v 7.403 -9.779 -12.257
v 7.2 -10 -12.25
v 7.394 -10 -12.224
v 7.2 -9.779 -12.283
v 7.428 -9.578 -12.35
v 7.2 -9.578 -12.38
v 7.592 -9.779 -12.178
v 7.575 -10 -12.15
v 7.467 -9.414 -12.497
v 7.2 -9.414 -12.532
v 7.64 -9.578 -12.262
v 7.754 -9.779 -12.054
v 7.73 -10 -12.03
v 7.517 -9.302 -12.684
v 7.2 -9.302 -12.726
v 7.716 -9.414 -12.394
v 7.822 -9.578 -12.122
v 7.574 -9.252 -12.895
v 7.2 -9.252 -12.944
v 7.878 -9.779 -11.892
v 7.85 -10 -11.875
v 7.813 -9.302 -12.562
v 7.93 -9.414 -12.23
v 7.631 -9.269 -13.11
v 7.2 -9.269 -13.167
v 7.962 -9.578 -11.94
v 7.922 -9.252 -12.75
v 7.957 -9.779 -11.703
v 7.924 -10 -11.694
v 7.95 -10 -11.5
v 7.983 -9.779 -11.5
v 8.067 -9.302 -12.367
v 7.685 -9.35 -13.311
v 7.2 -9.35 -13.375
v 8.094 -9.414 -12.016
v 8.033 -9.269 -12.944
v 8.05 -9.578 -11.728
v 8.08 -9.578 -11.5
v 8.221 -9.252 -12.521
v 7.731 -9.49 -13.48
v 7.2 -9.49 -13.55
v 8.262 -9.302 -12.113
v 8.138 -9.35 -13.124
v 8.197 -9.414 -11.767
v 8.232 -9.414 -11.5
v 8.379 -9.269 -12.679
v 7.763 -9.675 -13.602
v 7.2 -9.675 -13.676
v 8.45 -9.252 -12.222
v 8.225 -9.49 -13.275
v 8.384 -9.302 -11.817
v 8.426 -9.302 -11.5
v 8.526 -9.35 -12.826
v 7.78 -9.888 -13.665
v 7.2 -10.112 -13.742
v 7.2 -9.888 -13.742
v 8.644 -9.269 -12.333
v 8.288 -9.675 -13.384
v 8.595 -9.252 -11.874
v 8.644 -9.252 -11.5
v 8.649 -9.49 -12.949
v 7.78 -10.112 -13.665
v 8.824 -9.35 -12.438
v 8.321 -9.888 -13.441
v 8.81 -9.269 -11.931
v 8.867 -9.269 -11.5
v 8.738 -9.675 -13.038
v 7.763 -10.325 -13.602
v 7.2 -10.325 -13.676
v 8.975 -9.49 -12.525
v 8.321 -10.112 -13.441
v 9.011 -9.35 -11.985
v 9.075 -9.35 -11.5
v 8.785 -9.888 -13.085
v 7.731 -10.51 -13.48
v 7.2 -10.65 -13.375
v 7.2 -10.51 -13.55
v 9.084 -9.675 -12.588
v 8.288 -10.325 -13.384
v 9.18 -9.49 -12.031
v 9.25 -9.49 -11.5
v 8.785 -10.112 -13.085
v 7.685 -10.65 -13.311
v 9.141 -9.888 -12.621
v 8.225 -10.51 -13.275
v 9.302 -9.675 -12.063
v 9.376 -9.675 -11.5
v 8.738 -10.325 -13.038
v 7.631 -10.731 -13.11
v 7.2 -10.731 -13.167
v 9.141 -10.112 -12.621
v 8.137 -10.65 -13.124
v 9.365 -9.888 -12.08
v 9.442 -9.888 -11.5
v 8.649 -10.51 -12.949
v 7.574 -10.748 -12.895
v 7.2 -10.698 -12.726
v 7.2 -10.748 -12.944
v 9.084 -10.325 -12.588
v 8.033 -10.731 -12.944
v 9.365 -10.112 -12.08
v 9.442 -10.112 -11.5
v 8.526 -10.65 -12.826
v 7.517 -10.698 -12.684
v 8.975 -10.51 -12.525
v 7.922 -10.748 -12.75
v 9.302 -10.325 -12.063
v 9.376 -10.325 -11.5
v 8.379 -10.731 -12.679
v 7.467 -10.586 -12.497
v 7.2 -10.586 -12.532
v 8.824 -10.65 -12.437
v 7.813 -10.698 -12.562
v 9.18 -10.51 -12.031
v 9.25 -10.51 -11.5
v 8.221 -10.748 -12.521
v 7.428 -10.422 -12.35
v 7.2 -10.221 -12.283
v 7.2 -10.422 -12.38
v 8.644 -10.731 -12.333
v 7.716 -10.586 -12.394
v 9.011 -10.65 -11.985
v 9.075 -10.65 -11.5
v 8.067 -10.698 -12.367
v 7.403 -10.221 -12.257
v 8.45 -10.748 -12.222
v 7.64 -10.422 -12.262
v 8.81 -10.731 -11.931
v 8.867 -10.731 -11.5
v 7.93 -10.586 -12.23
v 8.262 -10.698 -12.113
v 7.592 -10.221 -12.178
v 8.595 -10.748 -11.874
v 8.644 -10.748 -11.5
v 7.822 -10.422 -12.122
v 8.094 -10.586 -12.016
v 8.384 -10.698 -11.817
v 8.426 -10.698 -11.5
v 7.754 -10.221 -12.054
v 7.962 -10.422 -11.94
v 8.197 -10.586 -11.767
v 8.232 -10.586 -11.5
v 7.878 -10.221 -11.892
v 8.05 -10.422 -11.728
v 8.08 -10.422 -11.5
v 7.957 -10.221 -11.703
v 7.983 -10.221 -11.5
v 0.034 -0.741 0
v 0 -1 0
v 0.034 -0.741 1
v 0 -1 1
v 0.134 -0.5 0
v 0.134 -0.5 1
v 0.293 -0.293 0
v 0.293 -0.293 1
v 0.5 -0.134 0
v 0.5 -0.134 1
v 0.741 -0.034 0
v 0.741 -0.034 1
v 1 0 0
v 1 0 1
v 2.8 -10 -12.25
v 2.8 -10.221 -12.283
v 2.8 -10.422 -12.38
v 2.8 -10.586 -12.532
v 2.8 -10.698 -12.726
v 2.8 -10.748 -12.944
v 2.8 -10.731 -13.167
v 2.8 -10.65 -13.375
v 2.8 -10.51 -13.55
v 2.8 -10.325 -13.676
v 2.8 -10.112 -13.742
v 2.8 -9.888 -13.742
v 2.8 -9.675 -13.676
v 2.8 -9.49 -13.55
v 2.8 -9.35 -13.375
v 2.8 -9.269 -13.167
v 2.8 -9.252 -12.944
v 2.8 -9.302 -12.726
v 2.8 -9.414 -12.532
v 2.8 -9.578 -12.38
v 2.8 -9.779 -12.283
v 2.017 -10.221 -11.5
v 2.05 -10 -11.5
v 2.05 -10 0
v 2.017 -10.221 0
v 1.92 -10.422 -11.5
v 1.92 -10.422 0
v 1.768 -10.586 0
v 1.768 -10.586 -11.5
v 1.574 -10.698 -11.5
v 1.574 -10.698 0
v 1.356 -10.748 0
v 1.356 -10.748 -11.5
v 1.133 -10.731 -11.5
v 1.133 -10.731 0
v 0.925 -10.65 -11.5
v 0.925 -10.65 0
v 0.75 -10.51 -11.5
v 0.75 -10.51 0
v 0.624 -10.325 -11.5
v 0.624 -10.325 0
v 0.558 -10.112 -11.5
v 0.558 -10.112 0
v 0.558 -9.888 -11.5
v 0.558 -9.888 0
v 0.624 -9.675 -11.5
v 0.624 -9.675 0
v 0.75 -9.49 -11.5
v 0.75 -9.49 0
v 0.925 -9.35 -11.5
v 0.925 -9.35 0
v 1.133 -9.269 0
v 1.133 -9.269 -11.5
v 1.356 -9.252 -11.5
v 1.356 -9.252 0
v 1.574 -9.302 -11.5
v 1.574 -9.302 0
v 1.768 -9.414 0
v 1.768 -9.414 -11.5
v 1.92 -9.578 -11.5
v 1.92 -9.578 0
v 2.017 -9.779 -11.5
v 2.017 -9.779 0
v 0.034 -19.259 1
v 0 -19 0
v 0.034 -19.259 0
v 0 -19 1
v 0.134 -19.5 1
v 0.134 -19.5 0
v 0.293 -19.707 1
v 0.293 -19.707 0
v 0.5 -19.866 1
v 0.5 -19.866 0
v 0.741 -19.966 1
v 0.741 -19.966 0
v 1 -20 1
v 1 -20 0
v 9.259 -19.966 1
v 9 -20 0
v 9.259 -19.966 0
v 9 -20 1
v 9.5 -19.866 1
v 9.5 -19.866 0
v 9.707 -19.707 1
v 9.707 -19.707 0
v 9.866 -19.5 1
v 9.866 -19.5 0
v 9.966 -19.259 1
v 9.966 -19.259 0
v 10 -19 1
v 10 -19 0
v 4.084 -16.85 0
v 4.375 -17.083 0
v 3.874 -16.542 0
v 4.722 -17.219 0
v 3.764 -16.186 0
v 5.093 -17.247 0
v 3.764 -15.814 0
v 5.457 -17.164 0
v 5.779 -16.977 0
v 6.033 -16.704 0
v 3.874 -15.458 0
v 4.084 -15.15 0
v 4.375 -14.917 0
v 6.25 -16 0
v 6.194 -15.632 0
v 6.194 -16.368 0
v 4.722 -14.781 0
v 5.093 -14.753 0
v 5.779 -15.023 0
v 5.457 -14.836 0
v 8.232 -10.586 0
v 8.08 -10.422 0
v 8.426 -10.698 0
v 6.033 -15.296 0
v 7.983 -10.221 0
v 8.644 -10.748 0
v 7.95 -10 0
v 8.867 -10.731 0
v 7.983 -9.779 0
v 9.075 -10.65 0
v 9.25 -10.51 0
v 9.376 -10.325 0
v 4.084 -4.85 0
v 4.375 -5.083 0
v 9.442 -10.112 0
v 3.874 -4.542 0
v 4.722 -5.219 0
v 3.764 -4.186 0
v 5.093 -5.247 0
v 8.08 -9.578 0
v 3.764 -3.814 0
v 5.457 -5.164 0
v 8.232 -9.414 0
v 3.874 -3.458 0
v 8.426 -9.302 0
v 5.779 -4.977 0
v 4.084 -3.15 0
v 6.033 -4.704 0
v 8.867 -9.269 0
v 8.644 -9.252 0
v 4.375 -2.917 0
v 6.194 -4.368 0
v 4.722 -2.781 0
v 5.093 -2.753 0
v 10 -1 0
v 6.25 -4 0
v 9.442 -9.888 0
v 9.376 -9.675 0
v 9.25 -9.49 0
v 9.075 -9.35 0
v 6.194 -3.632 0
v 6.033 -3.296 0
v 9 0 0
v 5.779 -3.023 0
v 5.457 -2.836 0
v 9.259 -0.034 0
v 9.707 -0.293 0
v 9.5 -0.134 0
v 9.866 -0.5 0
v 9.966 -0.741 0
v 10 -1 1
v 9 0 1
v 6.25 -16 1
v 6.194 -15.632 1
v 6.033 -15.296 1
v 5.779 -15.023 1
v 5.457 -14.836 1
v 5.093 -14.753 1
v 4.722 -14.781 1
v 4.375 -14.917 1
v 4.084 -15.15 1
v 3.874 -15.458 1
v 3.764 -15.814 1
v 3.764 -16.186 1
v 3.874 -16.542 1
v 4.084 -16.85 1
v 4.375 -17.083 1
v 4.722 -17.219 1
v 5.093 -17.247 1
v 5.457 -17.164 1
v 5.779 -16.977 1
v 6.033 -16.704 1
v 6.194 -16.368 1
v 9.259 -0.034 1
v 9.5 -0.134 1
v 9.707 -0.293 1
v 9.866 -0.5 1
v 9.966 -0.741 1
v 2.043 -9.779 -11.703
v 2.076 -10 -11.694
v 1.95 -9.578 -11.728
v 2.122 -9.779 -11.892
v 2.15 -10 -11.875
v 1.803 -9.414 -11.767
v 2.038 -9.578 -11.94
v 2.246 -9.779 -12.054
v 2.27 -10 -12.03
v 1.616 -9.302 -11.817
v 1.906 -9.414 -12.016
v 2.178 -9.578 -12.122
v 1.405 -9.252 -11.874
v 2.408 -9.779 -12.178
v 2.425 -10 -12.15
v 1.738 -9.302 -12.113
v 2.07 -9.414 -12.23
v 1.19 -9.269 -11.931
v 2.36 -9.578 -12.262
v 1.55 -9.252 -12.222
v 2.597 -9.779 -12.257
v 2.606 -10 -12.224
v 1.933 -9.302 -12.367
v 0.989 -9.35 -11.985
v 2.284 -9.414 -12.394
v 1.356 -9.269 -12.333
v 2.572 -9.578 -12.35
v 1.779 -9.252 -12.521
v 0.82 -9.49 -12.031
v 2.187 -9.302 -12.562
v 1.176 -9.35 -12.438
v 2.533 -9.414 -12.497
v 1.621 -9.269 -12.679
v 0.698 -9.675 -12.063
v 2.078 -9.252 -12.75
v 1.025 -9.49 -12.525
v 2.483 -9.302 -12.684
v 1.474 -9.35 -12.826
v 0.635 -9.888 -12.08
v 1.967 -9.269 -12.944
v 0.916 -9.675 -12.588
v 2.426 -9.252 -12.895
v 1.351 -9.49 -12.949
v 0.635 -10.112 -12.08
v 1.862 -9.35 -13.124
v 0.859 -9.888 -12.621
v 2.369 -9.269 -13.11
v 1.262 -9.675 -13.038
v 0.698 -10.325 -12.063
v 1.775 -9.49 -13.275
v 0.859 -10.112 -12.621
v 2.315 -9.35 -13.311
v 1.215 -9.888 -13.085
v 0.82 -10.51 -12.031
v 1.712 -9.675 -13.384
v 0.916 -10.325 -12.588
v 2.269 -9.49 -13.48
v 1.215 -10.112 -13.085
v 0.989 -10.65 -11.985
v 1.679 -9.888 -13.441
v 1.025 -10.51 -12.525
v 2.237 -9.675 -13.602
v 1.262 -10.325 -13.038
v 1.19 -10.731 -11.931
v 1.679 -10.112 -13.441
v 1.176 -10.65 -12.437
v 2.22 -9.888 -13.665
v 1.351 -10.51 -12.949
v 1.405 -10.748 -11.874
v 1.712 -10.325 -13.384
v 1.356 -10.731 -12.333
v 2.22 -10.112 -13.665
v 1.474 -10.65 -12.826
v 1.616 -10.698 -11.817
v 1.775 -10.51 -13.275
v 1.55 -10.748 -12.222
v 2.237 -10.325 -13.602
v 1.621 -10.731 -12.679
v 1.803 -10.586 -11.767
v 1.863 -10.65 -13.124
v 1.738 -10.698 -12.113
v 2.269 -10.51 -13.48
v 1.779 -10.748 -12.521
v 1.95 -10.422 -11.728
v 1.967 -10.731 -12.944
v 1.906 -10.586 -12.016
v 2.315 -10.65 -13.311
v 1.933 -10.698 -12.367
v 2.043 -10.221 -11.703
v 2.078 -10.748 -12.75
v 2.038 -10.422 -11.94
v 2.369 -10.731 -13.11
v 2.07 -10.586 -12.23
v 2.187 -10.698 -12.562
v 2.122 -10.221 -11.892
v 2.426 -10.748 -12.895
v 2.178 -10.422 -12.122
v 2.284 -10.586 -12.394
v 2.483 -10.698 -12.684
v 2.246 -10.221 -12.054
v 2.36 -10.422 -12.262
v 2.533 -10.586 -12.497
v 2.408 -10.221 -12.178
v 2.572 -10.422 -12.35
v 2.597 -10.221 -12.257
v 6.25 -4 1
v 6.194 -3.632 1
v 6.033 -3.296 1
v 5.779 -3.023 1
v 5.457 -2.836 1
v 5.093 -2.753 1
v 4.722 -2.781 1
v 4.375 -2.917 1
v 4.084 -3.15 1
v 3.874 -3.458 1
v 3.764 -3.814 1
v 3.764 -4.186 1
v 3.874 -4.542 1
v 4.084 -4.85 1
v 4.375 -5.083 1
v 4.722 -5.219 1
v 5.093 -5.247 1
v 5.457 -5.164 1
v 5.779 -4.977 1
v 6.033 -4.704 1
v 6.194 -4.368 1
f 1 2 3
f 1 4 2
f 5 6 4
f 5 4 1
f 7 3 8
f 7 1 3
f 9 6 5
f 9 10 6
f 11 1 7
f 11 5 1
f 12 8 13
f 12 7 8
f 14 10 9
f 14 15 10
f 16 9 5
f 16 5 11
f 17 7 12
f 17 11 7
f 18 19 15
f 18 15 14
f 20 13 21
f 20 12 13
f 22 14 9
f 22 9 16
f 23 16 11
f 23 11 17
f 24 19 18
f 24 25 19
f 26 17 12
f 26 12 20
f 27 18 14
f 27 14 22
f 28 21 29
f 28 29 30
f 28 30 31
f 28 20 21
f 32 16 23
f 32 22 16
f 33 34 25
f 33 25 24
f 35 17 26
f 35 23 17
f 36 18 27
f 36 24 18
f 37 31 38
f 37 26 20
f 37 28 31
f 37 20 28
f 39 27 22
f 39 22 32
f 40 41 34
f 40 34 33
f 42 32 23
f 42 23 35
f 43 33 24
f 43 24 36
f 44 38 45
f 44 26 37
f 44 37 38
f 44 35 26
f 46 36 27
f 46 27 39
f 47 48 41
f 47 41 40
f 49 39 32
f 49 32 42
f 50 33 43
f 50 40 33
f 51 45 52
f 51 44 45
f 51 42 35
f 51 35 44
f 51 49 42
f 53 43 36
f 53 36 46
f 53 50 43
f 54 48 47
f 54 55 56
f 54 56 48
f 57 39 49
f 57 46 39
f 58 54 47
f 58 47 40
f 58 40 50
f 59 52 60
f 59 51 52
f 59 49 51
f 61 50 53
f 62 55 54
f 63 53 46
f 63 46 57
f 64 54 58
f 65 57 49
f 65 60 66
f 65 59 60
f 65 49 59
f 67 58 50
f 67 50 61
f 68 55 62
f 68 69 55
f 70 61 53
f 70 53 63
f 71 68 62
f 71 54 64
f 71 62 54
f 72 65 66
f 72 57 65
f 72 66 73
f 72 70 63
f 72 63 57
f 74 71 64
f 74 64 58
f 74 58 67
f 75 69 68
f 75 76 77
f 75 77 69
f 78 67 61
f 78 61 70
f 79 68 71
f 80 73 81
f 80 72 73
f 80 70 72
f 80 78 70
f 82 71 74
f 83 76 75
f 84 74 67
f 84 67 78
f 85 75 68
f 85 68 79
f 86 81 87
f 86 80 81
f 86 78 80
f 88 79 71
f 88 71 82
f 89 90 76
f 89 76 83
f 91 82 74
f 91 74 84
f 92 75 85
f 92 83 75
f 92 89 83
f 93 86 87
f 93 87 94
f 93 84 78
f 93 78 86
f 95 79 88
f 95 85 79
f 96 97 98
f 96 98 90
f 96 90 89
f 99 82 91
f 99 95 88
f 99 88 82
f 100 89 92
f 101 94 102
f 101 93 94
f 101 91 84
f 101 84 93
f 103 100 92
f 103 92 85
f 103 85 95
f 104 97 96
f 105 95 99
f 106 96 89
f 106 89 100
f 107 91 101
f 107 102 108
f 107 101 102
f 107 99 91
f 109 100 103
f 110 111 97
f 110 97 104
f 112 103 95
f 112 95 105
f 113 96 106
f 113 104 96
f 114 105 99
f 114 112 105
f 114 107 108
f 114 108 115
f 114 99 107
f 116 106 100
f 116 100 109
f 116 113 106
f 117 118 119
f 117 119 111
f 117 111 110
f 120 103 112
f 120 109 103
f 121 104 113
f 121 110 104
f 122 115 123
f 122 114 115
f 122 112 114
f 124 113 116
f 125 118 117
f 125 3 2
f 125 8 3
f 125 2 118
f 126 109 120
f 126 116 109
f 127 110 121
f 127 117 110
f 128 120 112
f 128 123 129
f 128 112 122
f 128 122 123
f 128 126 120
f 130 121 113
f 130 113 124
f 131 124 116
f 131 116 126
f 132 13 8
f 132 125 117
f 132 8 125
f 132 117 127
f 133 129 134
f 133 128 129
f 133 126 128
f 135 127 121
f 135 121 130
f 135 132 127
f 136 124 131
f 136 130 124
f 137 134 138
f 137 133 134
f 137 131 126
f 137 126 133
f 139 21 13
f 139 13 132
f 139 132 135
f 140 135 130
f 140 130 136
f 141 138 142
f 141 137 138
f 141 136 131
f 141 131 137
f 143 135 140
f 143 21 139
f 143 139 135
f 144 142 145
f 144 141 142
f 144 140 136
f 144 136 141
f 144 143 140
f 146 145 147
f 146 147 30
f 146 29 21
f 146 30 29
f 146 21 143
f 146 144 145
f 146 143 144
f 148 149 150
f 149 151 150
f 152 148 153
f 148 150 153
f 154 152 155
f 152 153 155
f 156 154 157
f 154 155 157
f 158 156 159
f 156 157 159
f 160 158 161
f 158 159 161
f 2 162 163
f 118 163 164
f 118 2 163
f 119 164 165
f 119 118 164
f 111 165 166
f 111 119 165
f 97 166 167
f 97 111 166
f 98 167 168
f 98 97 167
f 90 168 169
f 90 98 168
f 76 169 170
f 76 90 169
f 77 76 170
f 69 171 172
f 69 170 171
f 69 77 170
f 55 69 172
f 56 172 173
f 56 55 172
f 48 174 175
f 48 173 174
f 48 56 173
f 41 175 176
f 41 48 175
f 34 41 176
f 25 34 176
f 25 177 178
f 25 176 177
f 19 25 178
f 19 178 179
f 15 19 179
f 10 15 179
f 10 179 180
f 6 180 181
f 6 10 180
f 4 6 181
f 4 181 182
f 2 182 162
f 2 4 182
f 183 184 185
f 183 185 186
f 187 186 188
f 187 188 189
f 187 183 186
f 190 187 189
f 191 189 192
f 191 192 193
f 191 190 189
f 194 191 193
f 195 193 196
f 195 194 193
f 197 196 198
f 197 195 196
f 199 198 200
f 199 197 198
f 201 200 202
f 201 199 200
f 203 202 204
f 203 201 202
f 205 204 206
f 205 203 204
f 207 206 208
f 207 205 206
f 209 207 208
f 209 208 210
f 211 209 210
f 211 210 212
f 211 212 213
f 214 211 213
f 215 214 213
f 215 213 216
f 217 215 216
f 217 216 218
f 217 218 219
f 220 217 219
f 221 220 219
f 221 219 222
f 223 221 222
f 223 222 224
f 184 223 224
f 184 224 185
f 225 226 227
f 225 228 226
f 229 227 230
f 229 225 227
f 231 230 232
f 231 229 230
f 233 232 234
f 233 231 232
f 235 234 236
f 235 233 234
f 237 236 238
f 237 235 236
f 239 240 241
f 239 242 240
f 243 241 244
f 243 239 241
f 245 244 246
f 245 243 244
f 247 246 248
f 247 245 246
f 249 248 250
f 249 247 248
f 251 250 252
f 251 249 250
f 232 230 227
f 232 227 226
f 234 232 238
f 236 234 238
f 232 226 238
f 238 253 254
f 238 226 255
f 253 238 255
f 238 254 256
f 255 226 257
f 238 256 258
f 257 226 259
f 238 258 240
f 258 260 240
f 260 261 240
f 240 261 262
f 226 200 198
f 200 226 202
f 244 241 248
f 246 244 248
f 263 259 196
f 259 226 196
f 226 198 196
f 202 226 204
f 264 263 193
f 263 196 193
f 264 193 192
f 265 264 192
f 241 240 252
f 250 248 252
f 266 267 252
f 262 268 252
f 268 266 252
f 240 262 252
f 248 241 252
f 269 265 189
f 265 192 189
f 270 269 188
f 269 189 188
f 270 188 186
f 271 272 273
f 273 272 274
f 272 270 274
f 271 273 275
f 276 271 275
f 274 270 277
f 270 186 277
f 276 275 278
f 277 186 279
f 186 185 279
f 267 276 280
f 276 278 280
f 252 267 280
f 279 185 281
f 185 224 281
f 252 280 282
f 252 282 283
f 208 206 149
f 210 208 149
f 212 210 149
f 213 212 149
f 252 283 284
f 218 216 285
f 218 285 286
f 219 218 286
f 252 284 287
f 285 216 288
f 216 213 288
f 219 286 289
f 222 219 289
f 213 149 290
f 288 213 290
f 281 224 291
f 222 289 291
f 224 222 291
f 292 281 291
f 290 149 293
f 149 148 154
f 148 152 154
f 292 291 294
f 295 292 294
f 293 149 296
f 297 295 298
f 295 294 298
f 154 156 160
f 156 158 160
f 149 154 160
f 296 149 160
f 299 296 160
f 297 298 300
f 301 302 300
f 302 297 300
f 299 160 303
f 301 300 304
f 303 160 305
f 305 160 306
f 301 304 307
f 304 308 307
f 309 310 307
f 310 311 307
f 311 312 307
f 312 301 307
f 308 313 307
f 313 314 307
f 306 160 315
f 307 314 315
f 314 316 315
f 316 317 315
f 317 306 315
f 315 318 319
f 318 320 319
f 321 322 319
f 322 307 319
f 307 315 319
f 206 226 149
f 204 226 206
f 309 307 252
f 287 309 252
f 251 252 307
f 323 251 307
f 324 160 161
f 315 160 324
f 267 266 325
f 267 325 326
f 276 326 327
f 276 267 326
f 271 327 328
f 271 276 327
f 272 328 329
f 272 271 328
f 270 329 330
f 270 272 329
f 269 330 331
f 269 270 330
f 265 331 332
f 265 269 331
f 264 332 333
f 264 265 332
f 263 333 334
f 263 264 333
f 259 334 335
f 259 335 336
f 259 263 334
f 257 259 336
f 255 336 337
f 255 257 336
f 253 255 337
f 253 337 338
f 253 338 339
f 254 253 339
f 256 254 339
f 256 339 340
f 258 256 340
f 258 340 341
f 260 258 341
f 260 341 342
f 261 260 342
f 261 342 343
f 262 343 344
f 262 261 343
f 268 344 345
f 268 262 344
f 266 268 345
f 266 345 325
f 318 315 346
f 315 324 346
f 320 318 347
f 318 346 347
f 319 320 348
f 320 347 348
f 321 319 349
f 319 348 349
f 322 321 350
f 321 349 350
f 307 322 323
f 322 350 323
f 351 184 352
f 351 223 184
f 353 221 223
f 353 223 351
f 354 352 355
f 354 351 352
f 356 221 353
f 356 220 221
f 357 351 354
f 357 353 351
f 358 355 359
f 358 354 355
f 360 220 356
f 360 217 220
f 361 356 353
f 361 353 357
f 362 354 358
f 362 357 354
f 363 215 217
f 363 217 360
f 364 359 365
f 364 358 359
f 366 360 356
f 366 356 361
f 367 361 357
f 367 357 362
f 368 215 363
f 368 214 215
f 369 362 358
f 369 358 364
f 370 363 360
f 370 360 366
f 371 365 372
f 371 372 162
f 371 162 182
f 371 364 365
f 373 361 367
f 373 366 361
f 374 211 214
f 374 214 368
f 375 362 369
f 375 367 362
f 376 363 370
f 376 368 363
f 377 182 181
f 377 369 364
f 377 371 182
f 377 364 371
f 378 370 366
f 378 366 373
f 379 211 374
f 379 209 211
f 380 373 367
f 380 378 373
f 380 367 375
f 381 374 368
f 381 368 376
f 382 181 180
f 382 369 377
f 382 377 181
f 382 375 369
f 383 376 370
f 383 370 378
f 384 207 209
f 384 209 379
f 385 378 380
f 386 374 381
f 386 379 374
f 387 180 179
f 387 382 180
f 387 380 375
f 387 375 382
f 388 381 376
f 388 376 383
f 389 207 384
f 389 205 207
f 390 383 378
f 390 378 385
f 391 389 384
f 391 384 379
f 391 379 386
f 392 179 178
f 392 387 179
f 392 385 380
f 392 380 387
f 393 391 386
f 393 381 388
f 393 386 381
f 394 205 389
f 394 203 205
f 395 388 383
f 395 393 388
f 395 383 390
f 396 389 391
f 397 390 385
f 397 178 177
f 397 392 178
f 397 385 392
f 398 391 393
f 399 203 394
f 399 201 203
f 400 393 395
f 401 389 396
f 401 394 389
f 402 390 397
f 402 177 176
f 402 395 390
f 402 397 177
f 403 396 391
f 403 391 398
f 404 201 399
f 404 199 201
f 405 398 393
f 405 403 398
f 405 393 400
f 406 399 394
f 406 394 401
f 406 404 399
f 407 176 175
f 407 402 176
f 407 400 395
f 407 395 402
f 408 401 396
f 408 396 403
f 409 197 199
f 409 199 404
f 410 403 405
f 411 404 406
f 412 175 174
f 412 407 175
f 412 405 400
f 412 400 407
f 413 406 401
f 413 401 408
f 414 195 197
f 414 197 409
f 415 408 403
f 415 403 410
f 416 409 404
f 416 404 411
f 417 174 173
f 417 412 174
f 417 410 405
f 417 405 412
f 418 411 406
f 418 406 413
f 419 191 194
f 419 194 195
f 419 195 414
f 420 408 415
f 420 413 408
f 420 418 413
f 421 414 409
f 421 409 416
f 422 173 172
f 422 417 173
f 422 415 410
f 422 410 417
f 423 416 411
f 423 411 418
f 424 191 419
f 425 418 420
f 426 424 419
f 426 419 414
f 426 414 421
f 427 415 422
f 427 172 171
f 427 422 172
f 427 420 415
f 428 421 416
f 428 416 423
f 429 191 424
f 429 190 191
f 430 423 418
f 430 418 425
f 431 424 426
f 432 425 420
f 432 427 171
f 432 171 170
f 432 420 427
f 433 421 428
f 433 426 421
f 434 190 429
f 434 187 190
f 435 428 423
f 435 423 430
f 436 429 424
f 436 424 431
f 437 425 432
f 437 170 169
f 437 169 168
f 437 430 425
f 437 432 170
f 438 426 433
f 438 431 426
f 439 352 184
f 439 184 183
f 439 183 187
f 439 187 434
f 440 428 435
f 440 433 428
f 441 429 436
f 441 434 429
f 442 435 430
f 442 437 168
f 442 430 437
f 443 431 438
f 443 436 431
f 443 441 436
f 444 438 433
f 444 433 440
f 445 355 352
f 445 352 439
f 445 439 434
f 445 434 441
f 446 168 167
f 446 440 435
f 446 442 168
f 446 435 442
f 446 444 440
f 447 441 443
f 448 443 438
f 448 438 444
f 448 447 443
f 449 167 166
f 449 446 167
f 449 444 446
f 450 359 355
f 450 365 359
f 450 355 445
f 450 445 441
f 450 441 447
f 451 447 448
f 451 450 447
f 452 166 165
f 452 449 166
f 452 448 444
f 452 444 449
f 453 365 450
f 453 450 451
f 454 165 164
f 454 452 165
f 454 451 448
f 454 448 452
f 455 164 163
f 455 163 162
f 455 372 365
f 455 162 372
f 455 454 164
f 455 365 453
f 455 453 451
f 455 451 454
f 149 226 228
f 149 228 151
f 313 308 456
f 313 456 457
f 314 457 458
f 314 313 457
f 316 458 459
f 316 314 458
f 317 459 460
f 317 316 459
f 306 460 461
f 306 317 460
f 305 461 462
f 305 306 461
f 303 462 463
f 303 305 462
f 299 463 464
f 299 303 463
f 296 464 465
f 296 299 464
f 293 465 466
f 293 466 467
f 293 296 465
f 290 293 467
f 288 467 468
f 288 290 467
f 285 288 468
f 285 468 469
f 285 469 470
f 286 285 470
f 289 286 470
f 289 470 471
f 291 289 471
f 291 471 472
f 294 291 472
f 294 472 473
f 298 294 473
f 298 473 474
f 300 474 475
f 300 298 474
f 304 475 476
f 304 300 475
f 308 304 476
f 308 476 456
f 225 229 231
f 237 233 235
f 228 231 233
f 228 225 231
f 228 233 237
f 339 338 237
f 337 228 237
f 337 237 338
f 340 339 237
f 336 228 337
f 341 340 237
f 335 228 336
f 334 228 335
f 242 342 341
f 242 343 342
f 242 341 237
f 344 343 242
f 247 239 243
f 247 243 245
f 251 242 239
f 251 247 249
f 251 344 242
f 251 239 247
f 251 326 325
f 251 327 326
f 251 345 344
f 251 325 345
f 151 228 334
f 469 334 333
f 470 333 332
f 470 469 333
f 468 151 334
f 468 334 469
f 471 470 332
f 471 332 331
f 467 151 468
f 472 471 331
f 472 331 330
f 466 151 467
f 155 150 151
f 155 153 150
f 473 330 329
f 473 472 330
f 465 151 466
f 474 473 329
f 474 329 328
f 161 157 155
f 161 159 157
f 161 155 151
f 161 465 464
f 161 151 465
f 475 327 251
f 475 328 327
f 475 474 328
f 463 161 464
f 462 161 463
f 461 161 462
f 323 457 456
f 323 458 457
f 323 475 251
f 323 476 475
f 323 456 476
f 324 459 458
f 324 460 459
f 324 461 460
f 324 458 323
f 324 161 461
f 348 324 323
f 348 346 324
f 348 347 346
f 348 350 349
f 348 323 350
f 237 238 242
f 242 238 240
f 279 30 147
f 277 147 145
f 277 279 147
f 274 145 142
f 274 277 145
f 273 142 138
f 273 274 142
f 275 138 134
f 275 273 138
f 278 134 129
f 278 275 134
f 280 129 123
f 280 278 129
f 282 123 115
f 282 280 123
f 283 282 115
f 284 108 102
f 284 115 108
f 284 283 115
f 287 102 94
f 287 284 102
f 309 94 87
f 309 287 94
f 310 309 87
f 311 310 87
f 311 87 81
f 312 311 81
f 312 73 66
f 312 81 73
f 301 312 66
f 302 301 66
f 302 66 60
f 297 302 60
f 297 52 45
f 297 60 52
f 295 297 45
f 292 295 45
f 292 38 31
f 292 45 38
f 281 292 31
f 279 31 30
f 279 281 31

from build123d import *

# Parameters (mm, degrees)
SKETCH_1_W      = 10
SKETCH_1_H      = 20
SKETCH_1_R      = 1.25
EXTRUDE_1_DEPTH = 1
FILLET_1_R      = 1
SKETCH_13_R     = 0.75


with BuildPart() as part:
    # 草图1 → 凸台-拉伸1 (new body)
    with BuildSketch(Plane.XY):
        with Locations((5, -10)):
            Rectangle(SKETCH_1_W, SKETCH_1_H)
        with Locations((5, -4)):
            Circle(SKETCH_1_R, mode=Mode.SUBTRACT)
        with Locations((5, -16)):
            Circle(SKETCH_1_R, mode=Mode.SUBTRACT)
    extrude(amount=EXTRUDE_1_DEPTH)

    # 圆角1
    fillet_1_edges = [part.edges().sort_by_distance(p)[0] for p in [
        (0, 0, 0.5),
        (10, 0, 0.5),
        (10, -20, 0.5),
        (0, -20, 0.5),
    ]]
    fillet(fillet_1_edges, radius=FILLET_1_R)

    # 扫描11: sweep along a path in 草图5
    with BuildLine(Plane(origin=(0, -10, 0), x_dir=(1, 0, 0), z_dir=(0, 1, 0))) as sweep_11_path:
        Line((1.3, 0), (1.3, 11.5))
        ThreePointArc((1.3, 11.5), (1.739339828, 12.560660172), (2.8, 13))
        Line((2.8, 13), (7.2, 13))
        ThreePointArc((7.2, 13), (8.260660172, 12.560660172), (8.7, 11.5))
        Line((8.7, 11.5), (8.7, 0))
    # 草图13 → 扫描11 (sweep)
    with BuildSketch(Plane(origin=(0, 0, 0), x_dir=(-1, 0, 0), z_dir=(0, 0, -1))):
        with Locations((-8.7, -10)):
            Circle(SKETCH_13_R)
    sweep(path=sweep_11_path.line)


solid = part.part
